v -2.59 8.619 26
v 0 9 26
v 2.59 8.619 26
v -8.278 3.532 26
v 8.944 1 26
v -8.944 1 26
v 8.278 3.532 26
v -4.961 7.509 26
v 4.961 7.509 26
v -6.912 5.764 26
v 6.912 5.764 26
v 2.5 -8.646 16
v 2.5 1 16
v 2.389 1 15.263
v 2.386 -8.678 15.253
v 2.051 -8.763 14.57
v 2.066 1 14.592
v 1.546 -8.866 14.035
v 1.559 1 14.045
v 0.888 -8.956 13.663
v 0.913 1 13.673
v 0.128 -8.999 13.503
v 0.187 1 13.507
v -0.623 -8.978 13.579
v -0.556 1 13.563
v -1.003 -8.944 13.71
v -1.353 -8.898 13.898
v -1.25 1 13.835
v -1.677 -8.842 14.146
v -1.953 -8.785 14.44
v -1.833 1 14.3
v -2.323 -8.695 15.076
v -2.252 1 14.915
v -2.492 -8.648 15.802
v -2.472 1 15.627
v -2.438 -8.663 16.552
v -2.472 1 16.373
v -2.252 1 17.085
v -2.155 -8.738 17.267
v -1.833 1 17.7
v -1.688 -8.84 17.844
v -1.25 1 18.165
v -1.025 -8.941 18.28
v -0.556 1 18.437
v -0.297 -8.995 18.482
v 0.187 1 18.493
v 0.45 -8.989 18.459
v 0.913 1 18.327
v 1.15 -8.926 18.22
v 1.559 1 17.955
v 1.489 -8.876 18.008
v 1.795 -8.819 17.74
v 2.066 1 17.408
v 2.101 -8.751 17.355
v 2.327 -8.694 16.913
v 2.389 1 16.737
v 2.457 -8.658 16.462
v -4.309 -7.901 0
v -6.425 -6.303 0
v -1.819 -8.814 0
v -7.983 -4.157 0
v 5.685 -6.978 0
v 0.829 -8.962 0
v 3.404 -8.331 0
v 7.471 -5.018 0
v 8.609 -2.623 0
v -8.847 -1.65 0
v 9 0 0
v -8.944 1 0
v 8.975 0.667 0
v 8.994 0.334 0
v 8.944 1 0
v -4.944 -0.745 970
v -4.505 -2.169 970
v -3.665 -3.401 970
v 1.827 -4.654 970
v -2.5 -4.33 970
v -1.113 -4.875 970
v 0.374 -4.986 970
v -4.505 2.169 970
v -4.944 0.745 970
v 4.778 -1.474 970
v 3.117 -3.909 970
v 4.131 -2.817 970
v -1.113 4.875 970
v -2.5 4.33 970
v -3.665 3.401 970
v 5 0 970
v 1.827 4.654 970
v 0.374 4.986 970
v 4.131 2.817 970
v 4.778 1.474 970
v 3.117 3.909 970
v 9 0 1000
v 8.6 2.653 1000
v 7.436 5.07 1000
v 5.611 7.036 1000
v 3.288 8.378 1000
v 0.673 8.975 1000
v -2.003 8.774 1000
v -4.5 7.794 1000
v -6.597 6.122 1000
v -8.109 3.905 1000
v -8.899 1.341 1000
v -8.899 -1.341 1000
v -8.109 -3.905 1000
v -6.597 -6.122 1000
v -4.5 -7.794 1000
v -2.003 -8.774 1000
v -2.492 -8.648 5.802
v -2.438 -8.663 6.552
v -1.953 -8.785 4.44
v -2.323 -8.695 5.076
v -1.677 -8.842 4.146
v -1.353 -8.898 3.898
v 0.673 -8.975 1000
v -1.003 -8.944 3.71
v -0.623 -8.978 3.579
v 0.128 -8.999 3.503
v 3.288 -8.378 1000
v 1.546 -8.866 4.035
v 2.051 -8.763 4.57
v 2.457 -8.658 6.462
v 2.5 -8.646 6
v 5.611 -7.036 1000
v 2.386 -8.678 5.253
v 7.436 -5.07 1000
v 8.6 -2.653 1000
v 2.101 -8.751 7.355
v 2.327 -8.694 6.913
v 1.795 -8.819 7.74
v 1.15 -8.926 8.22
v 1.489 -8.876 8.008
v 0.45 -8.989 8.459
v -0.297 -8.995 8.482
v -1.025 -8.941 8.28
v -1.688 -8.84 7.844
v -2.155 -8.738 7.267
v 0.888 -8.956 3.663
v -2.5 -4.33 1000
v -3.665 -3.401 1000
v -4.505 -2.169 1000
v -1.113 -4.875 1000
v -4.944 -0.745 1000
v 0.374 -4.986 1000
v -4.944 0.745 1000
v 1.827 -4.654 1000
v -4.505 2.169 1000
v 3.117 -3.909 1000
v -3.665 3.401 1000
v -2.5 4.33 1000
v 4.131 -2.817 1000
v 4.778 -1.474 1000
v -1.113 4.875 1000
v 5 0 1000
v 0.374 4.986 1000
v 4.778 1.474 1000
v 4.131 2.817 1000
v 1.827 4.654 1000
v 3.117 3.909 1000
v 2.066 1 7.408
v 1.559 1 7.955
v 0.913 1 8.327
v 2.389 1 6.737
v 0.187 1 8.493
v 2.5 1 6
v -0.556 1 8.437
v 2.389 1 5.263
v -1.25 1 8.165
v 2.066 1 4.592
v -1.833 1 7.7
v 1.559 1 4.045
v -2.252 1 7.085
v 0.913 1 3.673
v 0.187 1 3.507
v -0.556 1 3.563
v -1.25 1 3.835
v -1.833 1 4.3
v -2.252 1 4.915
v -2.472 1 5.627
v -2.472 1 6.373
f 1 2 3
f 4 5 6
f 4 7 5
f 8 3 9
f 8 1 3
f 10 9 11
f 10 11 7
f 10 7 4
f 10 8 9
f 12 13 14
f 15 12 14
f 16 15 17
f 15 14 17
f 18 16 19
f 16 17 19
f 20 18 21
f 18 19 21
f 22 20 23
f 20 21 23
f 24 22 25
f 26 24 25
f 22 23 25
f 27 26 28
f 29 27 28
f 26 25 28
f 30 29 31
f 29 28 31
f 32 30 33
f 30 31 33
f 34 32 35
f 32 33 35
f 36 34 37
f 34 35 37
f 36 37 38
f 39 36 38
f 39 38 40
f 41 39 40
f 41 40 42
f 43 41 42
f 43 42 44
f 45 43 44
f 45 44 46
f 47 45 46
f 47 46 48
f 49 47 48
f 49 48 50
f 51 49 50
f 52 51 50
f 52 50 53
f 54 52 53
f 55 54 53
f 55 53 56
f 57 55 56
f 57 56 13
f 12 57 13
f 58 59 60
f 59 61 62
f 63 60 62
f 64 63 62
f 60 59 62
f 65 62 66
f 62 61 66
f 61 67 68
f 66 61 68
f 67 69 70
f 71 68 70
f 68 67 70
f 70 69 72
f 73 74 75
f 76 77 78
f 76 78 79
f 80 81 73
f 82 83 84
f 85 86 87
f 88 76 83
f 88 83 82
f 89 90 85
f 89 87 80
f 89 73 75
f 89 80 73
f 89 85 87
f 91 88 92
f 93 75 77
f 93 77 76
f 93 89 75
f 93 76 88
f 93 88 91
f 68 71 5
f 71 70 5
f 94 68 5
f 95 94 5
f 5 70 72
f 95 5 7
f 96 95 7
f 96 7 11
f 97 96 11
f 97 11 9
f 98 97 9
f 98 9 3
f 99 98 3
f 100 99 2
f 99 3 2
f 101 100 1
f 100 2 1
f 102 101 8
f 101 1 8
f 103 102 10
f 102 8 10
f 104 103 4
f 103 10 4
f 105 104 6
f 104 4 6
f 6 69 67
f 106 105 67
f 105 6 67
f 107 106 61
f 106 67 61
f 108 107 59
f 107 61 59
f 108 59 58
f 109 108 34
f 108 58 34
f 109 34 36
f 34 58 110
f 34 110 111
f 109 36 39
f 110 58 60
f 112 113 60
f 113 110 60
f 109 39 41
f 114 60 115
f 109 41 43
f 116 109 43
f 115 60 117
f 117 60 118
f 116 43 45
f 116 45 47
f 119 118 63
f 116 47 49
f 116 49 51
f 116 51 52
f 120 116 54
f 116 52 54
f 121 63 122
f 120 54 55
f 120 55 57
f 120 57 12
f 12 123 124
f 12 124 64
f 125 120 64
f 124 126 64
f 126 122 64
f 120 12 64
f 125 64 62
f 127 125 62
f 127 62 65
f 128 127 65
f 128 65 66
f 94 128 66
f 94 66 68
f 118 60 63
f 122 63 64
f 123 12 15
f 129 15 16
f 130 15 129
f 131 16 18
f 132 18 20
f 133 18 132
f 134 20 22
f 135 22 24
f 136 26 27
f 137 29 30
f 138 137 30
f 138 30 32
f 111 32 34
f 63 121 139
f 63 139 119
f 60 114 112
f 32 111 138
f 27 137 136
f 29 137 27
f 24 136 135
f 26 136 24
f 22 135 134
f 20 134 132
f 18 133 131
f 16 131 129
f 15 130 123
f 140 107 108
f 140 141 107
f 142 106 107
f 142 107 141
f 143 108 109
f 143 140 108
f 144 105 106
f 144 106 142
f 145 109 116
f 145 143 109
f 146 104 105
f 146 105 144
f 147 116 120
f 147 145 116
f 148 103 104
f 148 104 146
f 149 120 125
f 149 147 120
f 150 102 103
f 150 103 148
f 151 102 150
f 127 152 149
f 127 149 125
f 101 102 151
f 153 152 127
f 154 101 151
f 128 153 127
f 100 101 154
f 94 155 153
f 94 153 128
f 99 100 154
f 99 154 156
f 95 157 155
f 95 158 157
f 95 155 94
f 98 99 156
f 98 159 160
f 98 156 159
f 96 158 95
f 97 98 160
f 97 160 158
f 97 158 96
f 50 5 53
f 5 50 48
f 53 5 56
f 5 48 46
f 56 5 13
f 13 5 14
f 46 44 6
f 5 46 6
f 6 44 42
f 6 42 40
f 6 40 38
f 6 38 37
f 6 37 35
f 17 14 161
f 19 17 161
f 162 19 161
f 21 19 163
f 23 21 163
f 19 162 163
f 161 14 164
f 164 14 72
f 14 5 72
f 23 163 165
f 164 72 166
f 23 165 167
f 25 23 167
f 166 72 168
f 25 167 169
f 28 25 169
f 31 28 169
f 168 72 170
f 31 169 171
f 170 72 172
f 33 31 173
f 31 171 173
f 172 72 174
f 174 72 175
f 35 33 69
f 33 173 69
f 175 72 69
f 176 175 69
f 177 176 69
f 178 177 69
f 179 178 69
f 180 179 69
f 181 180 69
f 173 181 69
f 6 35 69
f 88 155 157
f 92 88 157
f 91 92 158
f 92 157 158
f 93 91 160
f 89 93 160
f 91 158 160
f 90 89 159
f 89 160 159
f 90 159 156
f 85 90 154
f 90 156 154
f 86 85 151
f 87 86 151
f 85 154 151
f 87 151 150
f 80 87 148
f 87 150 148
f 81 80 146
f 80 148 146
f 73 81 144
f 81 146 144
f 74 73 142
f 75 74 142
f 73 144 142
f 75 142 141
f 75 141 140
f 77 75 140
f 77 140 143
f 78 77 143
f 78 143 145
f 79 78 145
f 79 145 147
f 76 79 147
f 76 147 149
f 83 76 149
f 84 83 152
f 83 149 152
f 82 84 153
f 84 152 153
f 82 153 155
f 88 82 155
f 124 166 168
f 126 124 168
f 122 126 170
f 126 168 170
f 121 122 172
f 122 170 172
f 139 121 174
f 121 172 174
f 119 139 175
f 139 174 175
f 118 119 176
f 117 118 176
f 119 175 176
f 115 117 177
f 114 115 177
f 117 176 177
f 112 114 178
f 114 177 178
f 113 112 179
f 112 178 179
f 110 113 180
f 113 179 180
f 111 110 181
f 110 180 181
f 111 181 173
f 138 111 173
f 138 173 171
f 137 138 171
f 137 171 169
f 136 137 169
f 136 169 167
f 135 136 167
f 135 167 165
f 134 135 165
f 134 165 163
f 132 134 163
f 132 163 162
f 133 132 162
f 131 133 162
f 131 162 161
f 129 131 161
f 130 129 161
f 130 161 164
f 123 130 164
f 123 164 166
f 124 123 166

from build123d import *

# Parameters (mm, degrees)
CROQUIS1_R              = 9
SALIENTE_EXTRUIR1_DEPTH = 1000
CROQUIS2_R              = 5
CORTAR_EXTRUIR1_DEPTH   = 30
CORTAR_EXTRUIR2_DEPTH   = 26
CROQUIS5_R              = 2.5
CORTAR_EXTRUIR3_DEPTH   = 10


with BuildPart() as part:
    # Croquis1 → Saliente-Extruir1 (new body)
    with BuildSketch(Plane.XY):
        Circle(CROQUIS1_R)
    extrude(amount=SALIENTE_EXTRUIR1_DEPTH)

    # Croquis2 → Cortar-Extruir1 (cut)
    with BuildSketch(Plane.XY.offset(1000)):
        Circle(CROQUIS2_R)
    extrude(amount=-CORTAR_EXTRUIR1_DEPTH, mode=Mode.SUBTRACT)

    # Croquis4 → Cortar-Extruir2 (cut)
    with BuildSketch(Plane(origin=(0, 0, 0), x_dir=(-1, 0, 0), z_dir=(0, 0, -1))):
        with BuildLine():
            Line((-8.94427191, 1), (8.94427191, 1))
            ThreePointArc((8.94427191, 1), (6, 6.708203932), (0, 9))
            ThreePointArc((0, 9), (-6, 6.708203932), (-8.94427191, 1))
        make_face()
    extrude(amount=-CORTAR_EXTRUIR2_DEPTH, mode=Mode.SUBTRACT)

    # Croquis5 → Cortar-Extruir3 (cut)
    with BuildSketch(Plane(origin=(0, 1, 0), x_dir=(1, 0, 0), z_dir=(0, 1, 0))):
        with Locations((0, -6)):
            Circle(CROQUIS5_R)
        with Locations((0, -16)):
            Circle(CROQUIS5_R)
    extrude(amount=-CORTAR_EXTRUIR3_DEPTH, mode=Mode.SUBTRACT)


solid = part.part
